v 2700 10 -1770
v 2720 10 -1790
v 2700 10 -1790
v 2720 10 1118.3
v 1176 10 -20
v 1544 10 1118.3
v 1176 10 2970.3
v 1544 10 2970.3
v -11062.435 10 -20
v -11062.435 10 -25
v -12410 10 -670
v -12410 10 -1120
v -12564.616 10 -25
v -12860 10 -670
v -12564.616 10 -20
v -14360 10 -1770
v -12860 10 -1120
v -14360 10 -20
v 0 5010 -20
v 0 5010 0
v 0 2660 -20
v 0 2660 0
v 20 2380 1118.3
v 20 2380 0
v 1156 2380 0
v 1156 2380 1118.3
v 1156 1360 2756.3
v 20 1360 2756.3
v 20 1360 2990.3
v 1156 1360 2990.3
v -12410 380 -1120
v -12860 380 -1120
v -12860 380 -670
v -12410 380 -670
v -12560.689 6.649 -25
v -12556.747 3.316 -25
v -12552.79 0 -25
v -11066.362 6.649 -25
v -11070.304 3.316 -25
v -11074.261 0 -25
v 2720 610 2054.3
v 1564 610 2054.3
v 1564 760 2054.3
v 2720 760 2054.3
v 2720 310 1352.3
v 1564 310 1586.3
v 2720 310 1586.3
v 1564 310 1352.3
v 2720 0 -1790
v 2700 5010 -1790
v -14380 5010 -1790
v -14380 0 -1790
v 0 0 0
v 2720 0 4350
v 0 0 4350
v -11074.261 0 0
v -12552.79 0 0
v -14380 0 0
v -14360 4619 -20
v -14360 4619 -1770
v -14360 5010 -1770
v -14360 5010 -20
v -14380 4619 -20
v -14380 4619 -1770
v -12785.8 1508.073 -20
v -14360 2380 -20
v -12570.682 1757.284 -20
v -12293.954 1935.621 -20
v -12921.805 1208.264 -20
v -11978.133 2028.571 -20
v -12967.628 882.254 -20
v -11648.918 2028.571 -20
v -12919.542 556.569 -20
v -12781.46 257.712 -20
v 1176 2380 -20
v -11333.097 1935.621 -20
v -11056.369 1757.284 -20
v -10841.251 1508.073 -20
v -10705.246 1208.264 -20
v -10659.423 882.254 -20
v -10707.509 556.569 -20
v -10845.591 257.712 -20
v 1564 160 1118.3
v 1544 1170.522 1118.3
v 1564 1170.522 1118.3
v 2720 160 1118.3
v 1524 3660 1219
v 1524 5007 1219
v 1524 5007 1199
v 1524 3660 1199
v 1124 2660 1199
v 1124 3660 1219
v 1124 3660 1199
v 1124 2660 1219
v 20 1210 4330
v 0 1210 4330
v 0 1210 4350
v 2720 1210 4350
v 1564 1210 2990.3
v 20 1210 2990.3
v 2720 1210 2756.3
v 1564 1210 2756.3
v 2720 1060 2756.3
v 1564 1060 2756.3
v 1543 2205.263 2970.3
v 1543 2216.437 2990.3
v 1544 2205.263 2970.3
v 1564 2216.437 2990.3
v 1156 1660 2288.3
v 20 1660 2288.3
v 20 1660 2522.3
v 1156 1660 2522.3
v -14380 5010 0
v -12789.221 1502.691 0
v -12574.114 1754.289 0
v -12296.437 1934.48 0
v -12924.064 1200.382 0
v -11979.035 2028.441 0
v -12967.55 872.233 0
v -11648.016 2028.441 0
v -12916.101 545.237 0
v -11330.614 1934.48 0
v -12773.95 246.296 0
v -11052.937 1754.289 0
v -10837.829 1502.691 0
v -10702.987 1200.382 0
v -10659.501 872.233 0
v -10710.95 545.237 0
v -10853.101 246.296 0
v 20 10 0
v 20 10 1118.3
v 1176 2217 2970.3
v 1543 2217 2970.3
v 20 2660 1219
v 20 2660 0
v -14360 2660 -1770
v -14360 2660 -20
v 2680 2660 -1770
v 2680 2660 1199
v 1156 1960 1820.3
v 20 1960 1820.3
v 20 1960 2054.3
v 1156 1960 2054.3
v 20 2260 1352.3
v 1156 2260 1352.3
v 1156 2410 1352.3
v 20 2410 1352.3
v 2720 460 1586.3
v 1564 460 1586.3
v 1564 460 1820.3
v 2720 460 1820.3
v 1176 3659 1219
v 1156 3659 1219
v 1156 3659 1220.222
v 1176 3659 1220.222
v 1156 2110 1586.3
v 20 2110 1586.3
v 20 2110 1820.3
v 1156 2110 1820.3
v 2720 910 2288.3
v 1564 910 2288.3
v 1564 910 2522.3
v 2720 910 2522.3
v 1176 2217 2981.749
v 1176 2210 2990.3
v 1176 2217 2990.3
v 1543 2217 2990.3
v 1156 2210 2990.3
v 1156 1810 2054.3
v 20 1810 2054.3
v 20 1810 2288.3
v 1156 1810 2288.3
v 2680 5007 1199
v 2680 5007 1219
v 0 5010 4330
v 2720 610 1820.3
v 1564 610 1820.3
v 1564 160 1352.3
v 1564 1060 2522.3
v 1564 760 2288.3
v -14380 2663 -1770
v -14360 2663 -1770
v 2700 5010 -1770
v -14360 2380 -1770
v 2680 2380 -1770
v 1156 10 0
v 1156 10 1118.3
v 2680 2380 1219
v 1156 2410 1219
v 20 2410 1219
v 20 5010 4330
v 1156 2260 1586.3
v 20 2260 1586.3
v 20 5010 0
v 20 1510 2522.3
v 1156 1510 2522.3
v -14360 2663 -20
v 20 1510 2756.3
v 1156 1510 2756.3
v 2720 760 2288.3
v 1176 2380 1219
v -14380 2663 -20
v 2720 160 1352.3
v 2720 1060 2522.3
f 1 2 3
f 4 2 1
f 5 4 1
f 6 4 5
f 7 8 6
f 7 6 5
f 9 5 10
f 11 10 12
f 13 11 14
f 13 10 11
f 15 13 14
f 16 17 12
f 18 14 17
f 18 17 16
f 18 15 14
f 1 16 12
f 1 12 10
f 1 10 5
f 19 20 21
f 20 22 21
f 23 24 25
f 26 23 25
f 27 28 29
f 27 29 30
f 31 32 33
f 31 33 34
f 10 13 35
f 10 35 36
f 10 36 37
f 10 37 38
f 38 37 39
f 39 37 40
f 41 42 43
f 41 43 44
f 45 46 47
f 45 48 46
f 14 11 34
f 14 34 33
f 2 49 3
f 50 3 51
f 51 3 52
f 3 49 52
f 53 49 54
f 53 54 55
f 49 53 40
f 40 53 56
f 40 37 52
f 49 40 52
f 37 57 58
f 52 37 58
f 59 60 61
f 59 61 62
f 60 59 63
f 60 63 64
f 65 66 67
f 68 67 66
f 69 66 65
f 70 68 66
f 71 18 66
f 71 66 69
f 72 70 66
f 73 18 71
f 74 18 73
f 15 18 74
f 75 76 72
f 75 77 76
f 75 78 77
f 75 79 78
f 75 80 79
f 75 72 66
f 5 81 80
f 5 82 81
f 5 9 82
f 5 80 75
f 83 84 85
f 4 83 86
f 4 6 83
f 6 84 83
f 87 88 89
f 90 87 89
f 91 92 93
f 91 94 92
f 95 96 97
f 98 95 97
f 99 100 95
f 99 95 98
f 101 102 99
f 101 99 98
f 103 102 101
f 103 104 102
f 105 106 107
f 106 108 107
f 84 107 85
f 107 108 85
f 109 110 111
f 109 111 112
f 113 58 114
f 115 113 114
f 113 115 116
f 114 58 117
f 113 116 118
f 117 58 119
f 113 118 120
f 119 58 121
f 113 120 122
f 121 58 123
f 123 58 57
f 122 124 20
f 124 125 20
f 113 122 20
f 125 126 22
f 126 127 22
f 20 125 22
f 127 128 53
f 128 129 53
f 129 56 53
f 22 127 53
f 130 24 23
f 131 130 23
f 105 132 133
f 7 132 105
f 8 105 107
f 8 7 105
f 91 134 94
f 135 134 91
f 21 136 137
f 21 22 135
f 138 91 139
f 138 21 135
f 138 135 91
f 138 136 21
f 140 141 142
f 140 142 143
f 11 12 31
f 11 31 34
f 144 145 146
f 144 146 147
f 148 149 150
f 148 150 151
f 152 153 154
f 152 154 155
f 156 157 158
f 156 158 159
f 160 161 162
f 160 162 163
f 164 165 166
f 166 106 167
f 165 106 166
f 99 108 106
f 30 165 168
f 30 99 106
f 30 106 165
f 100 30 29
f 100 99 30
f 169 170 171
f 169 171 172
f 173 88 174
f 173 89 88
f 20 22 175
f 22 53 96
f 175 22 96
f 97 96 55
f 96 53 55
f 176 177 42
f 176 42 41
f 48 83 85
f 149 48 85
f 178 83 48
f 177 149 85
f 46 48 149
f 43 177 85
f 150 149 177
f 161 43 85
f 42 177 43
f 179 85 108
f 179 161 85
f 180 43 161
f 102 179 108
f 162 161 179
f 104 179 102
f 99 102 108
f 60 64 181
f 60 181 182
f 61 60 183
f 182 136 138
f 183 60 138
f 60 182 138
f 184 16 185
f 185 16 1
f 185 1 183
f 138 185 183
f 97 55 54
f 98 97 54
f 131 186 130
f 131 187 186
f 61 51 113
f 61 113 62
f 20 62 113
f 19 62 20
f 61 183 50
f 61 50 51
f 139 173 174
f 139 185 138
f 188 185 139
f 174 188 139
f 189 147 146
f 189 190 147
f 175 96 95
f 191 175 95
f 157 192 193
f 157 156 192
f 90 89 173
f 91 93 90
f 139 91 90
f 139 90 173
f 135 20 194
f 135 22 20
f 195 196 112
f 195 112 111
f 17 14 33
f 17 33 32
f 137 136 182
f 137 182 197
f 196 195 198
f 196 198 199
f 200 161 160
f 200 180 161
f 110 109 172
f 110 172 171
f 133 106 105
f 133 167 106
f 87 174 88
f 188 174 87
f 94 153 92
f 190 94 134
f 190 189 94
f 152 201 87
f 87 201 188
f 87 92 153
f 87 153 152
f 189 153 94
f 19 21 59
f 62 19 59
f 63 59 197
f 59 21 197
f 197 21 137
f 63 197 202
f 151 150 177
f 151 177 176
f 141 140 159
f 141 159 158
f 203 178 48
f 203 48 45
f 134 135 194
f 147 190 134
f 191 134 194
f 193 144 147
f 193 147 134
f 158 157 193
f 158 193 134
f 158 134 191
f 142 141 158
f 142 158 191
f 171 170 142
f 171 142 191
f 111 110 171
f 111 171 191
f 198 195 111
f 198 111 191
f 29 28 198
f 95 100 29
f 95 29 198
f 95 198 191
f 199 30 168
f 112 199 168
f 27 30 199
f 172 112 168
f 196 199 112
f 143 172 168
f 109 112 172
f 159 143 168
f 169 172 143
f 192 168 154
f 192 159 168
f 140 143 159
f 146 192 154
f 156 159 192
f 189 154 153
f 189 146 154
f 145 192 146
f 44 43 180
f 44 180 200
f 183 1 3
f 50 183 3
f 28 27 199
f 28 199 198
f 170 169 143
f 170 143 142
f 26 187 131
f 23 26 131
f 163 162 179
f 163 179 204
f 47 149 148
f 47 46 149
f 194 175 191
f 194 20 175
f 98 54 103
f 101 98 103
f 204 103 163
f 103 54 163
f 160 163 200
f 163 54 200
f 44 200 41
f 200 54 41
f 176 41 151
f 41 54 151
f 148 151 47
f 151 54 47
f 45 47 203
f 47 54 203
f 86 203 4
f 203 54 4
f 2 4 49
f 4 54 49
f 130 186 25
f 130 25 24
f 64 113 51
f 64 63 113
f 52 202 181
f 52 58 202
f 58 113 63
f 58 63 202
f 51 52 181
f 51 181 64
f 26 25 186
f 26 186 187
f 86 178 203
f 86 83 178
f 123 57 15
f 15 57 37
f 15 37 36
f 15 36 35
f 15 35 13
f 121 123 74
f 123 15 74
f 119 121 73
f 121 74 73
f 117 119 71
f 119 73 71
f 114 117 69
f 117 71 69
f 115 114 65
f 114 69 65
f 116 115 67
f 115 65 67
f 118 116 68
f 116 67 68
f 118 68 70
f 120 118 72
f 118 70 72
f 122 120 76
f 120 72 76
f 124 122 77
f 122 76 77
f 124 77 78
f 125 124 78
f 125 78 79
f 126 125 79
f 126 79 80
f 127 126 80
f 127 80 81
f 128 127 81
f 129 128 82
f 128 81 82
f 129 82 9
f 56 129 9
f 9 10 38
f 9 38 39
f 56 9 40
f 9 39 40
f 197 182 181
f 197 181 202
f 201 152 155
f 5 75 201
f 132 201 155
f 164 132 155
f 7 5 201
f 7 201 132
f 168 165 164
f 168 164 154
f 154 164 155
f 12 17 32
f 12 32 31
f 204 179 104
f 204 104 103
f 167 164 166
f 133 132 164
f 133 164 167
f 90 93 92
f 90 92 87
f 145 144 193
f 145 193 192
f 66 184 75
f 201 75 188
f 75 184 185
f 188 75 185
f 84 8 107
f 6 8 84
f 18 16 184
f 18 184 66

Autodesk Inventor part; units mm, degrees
ref_plane "YZ Plane" through (0, 0, 0) normal (1, 0, 0) x (0, 1, 0)
ref_plane "XZ Plane" through (0, 0, 0) normal (0, 1, 0) x (-1, 0, 0)
sketch "Sketch1" plane through (0, 0, 0) normal (0, 1, 0) x (-1, 0, 0)
  line L0 (0, 0) -> (14380, 0)
  line L1 (14380, 0) -> (14380, -1790)
  line L2 (14380, -1790) -> (0, -1790)
  line L3 (0, -1790) -> (0, 0)
  line L4 (0, -1790) -> (-2720, -1790)
  line L5 (-2720, -1790) -> (-2720, 4350)
  line L6 (-2720, 4350) -> (0, 4350)
  line L7 (0, 4350) -> (0, -1790)
  dimension "d0" = 1790
  dimension "d2" = 14380
  dimension "d3" = 2720
  dimension "d4" = 6140
extrude "Extrusion1" add sketch "Sketch1" along normal blind 10
sketch "Sketch2" plane through (0, 10, 0) normal (0, 1, 0) x (1, 0, 0)
  line L0 (2720, -4350) -> (2720, 1790) projected
  line L1 (0, -4350) -> (2720, -4350)
  line L2 (2720, -4350) -> (2720, -4330)
  line L3 (2720, -4330) -> (0, -4330)
  line L4 (0, -4330) -> (0, -4350)
  dimension "d7" = 20
extrude "Extrusion2" [suppressed]
sketch "Sketch3" plane through (0, 10, 0) normal (0, 1, 0) x (1, 0, 0)
  line L0 (2720, 1790) -> (-14380, 1790) projected
  line L1 (2720, -4330) -> (2700, -4330)
  line L2 (2700, -4330) -> (2700, 1790)
  line L3 (2700, 1790) -> (2720, 1790)
  line L4 (2720, 1790) -> (2720, -4330)
  dimension "d11" = 20
sketch "Sketch4" plane through (0, 10, 0) normal (0, 1, 0) x (1, 0, 0)
  line L0 (-14380, 1790) -> (-14380, 0) projected
  line L1 (2700, 1790) -> (-14380, 1790)
  line L2 (-14380, 1790) -> (-14380, 1770)
  line L3 (-14380, 1770) -> (2700, 1770)
  line L4 (2700, 1770) -> (2700, 1790)
  dimension "d15" = 20
extrude "Extrusion4" add sketch "Sketch4" along normal blind 5000
sketch "Sketch5" plane through (0, 10, 0) normal (0, 1, 0) x (1, 0, 0)
  line L0 (-14380, 0) -> (0, 0) projected
  line L1 (-14380, 1770) -> (-14360, 1770)
  line L2 (-14360, 1770) -> (-14360, 0)
  line L3 (-14360, 0) -> (-14380, 0)
  line L4 (-14380, 0) -> (-14380, 1770)
  dimension "d19" = 20
extrude "Extrusion5" add sketch "Sketch5" along normal blind 5000
sketch "Sketch6" plane through (0, 10, 0) normal (0, 1, 0) x (1, 0, 0)
  line L0 (-14360, 0) -> (0, 0)
  line L1 (0, 0) -> (0, 20)
  line L2 (0, 20) -> (-14360, 20)
  line L3 (-14360, 20) -> (-14360, 0)
  dimension "d23" = 20
extrude "Extrusion6" add sketch "Sketch6" along normal blind 5000
sketch "Sketch7" plane through (0, 10, 0) normal (0, 1, 0) x (1, 0, 0)
  line L0 (0, 0) -> (0, -4350) projected
  line L1 (0, -4330) -> (2720, -4330) projected
  line L2 (0, 0) -> (20, 0)
  line L3 (20, 0) -> (20, -4330)
  line L4 (20, -4330) -> (0, -4330)
  line L5 (0, -4330) -> (0, 0)
  point P0 (2700, -4330)
  dimension "d27" = 20
extrude "Extrusion7" add sketch "Sketch7" along normal blind 5000
ref_plane "Work Plane1" through (2690, 10, 4330) normal (-1, 0, 0) x (0, 0, 1)
sketch "Sketch12" plane through (0, 10, 0) normal (0, 1, 0) x (1, 0, 0)
  line L0 (-14360, 1770) -> (-14360, 20) projected
  line L1 (-14360, 20) -> (0, 20) projected
  line L2 (-12860, 1120) -> (-12410, 1120)
  line L3 (-12410, 1120) -> (-12410, 670)
  line L4 (-12410, 670) -> (-12860, 670)
  line L5 (-12860, 670) -> (-12860, 1120)
  dimension "d115" = 1500
  dimension "d116" = 450
  dimension "d117" = 450
  dimension "d118" = 650
extrude "Extrusion12" add sketch "Sketch12" along normal blind 370
sketch "Sketch13" plane through (-14360, 10, -1770) normal (1, 0, 0) x (0, 0, -1)
  line L0 (-1750, 5000) -> (-1750, 0) projected
  line L1 (0, 0) -> (-1750, 0) projected
  line L2 (0, 5000) -> (0, 0) projected
  line L3 (-1750, 5000) -> (0, 5000) projected
  line L4 (-1750, 2650) -> (0, 2650)
  line L5 (0, 2650) -> (0, 2370)
  line L6 (0, 2370) -> (-1750, 2370)
  line L7 (-1750, 2370) -> (-1750, 2650)
  point P0 (-1770, -10)
  dimension "d121" = 2370
  dimension "d122" = 2350
extrude "Extrusion13" add sketch "Sketch13" along normal blind 17040 contours L4 L2 L6 L0
sketch "Sketch14" plane through (0, 2380, -20) normal (0, 0, 1) x (1, 0, 0)
  line L0 (0, 0) -> (0, 280) projected
  line L1 (0, 0) -> (2680, 0) projected
  line L2 (0, 280) -> (2680, 280)
  line L3 (2680, 280) -> (2680, 0)
  line L4 (2680, 0) -> (0, 0)
  line L5 (0, 0) -> (0, 280)
  point P0 (0, -2380)
extrude "Extrusion14" add sketch "Sketch14" along normal blind 1239
sketch "Sketch16" plane through (-14360, 2660, -20) normal (0, 1, 0) x (1, 0, 0)
  line L0 (17040, -1239) -> (15884, -1239)
  line L1 (15884, -1239) -> (15884, -1219)
  line L2 (15884, -1219) -> (17040, -1219)
  line L3 (17040, -1219) -> (17040, -1239)
  line L4 (15884, -1239) -> (15484, -1239)
  line L5 (15484, -1239) -> (15484, -1219)
  line L6 (15484, -1219) -> (15884, -1219)
  line L7 (15884, -1219) -> (15884, -1239)
  dimension "d168" = 20
  dimension "d170" = 1156
  dimension "d258" = 20
  dimension "d259" = 400
extrude "Extrusion17" add sketch "Sketch16" along normal blind 2347 contours L0 L1 L2 L3
sketch "Sketch17" plane through (-14380, 0, -1790) normal (-1, 0, 0) x (0, 0, 1)
  line L0 (0, 5010) -> (1790, 5010) projected
  line L1 (20, 2663) -> (1770, 2663)
  line L2 (1770, 2663) -> (1770, 4619)
  line L3 (1770, 4619) -> (20, 4619)
  line L4 (20, 4619) -> (20, 2663)
  line L5 (0, 0) -> (0, 5010) projected
  dimension "d179" = 20
  dimension "d180" = 1750
  dimension "d181" = 391
  dimension "d182" = 1956
extrude "Extrusion18" cut sketch "Sketch17" along normal mid plane 50
sketch "Sketch18" plane through (-14380, 0, 0) normal (0, 0, 1) x (1, 0, 0)
  line L0 (0, 0) -> (14380, 0) projected
  arc A0 (3305.7392, 0) -> (1827.2099, 0) centre (2566.4746, 886.2602) ccw
extrude "Extrusion19" cut sketch "Sketch18" along normal mid plane 50
sketch "Sketch19" plane through (0, 10, 0) normal (0, 1, 0) x (1, 0, 0)
  line L0 (2720, -4350) -> (2720, 1790) projected
  line L1 (2720, -1118.3) -> (1564, -1118.3)
  line L2 (1564, -1118.3) -> (1564, -1352.3)
  line L3 (1564, -1352.3) -> (2720, -1352.3)
  line L4 (2720, -1352.3) -> (2720, -1118.3)
  line L5 (2700, 1790) -> (-14380, 1790) projected
  line L6 (2720, -1352.3) -> (1564, -1352.3)
  line L7 (1564, -1352.3) -> (1564, -1586.3)
  line L8 (1564, -1586.3) -> (2720, -1586.3)
  line L9 (2720, -1586.3) -> (2720, -1352.3)
  line L10 (2720, -1586.3) -> (1564, -1586.3)
  line L11 (1564, -1586.3) -> (1564, -1820.3)
  line L12 (1564, -1820.3) -> (2720, -1820.3)
  line L13 (2720, -1820.3) -> (2720, -1586.3)
  line L14 (2720, -1820.3) -> (1564, -1820.3)
  line L15 (1564, -1820.3) -> (1564, -2054.3)
  line L16 (1564, -2054.3) -> (2720, -2054.3)
  line L17 (2720, -2054.3) -> (2720, -1820.3)
  line L18 (2720, -2054.3) -> (1564, -2054.3)
  line L19 (1564, -2054.3) -> (1564, -2288.3)
  line L20 (1564, -2288.3) -> (2720, -2288.3)
  line L21 (2720, -2288.3) -> (2720, -2054.3)
  line L22 (2720, -2288.3) -> (1564, -2288.3)
  line L23 (1564, -2288.3) -> (1564, -2522.3)
  line L24 (1564, -2522.3) -> (2720, -2522.3)
  line L25 (2720, -2522.3) -> (2720, -2288.3)
  line L26 (2720, -2522.3) -> (1564, -2522.3)
  line L27 (1564, -2522.3) -> (1564, -2756.3)
  line L28 (1564, -2756.3) -> (2720, -2756.3)
  line L29 (2720, -2756.3) -> (2720, -2522.3)
  line L30 (2720, -2756.3) -> (1564, -2756.3)
  line L31 (1564, -2756.3) -> (1564, -2990.3)
  line L32 (1564, -2990.3) -> (2720, -2990.3)
  line L33 (2720, -2990.3) -> (2720, -2756.3)
  line L34 (0, 0) -> (0, -4350) projected
  line L35 (2720, -2990.3) -> (0, -2990.3)
  line L36 (0, -2990.3) -> (0, -4350)
  line L37 (0, -4350) -> (2720, -4350)
  line L38 (2720, -4350) -> (2720, -2990.3)
  line L39 (0, -2990.3) -> (1156, -2990.3)
  line L40 (1156, -2990.3) -> (1156, -2756.3)
  line L41 (1156, -2756.3) -> (0, -2756.3)
  line L42 (0, -2756.3) -> (0, -2990.3)
  line L43 (0, -2756.3) -> (1156, -2756.3)
  line L44 (1156, -2756.3) -> (1156, -2522.3)
  line L45 (1156, -2522.3) -> (0, -2522.3)
  line L46 (0, -2522.3) -> (0, -2756.3)
  line L47 (0, -2522.3) -> (1156, -2522.3)
  line L48 (1156, -2522.3) -> (1156, -2288.3)
  line L49 (1156, -2288.3) -> (0, -2288.3)
  line L50 (0, -2288.3) -> (0, -2522.3)
  line L51 (0, -2288.3) -> (1156, -2288.3)
  line L52 (1156, -2288.3) -> (1156, -2054.3)
  line L53 (1156, -2054.3) -> (0, -2054.3)
  line L54 (0, -2054.3) -> (0, -2288.3)
  line L55 (0, -2054.3) -> (1156, -2054.3)
  line L56 (1156, -2054.3) -> (1156, -1820.3)
  line L57 (1156, -1820.3) -> (0, -1820.3)
  line L58 (0, -1820.3) -> (0, -2054.3)
  line L59 (0, -1820.3) -> (1156, -1820.3)
  line L60 (1156, -1820.3) -> (1156, -1586.3)
  line L61 (1156, -1586.3) -> (0, -1586.3)
  line L62 (0, -1586.3) -> (0, -1820.3)
  line L63 (0, -1586.3) -> (1156, -1586.3)
  line L64 (1156, -1586.3) -> (1156, -1352.3)
  line L65 (1156, -1352.3) -> (0, -1352.3)
  line L66 (0, -1352.3) -> (0, -1586.3)
  line L67 (0, -1352.3) -> (1156, -1352.3)
  line L68 (1156, -1352.3) -> (1156, -1118.3)
  line L69 (1156, -1118.3) -> (0, -1118.3)
  line L70 (0, -1118.3) -> (0, -1352.3)
  line L71 (-11062.4346, 20) -> (0, 20) projected
  line L72 (0, 20) -> (1156, 20)
  line L73 (1156, 20) -> (1156, 0)
  line L74 (1156, 0) -> (0, 0)
  line L75 (0, 0) -> (0, 20)
  line L76 (0, 20) -> (2680, 20) projected
  line L77 (1156, -2990.3) -> (1176, -2990.3)
  line L78 (1176, -2990.3) -> (1176, 20)
  line L79 (1176, 20) -> (1156, 20)
  line L80 (1156, 20) -> (1156, -2990.3)
  line L81 (1564, -2990.3) -> (1544, -2990.3)
  line L82 (1544, -2990.3) -> (1544, -1118.3)
  line L83 (1544, -1118.3) -> (1564, -1118.3)
  line L84 (1564, -1118.3) -> (1564, -2990.3)
  line L85 (1544, -2990.3) -> (1176, -2990.3)
  line L86 (1176, -2990.3) -> (1176, -2970.3)
  line L87 (1176, -2970.3) -> (1544, -2970.3)
  line L88 (1544, -2970.3) -> (1544, -2990.3)
  point P0 (0, -2756.3)
  point P1 (0, -2522.3)
  point P2 (0, -2288.3)
  point P3 (0, -2054.3)
  point P4 (0, -1820.3)
  point P5 (0, -1586.3)
  point P6 (0, -1352.3)
  point P7 (0, -1118.3)
  dimension "d183" = 2908.3
  dimension "d184" = 234
  dimension "d185" = 1156
  dimension "d186" = 234
  dimension "d187" = 234
  dimension "d188" = 234
  dimension "d189" = 234
  dimension "d190" = 234
  dimension "d191" = 234
  dimension "d192" = 234
  dimension "d193" = 1156
  dimension "d194" = 0
  dimension "d195" = 0
  dimension "d196" = 0
  dimension "d197" = 0
  dimension "d198" = 0
  dimension "d199" = 0
  dimension "d200" = 0
  dimension "d201" = 1156
  dimension "d202" = 1156
  dimension "d203" = 1156
  dimension "d204" = 1156
  dimension "d205" = 1156
  dimension "d206" = 1156
  dimension "d207" = 1156
  dimension "d208" = 234
  dimension "d209" = 1156
  dimension "d210" = 0
  dimension "d211" = 0
  dimension "d212" = 0
  dimension "d213" = 0
  dimension "d214" = 0
  dimension "d215" = 0
  dimension "d216" = 468
  dimension "d251" = 20
  dimension "d252" = 20
  dimension "d253" = 20
  dimension "d268" = 20
extrude "Extrusion20" add sketch "Sketch19" along normal blind 150 contours L1 L0 L3 L2
extrude "Extrusion21" add sketch "Sketch19" along normal blind 300 contours L8 L7 L3 L0
extrude "Extrusion22" add sketch "Sketch19" along normal blind 450 contours L12 L11 L8 L0
extrude "Extrusion23" add sketch "Sketch19" along normal blind 600 contours L16 L15 L12 L0
extrude "Extrusion24" add sketch "Sketch19" along normal blind 750 contours L20 L19 L16 L0
extrude "Extrusion25" add sketch "Sketch19" along normal blind 900 contours L24 L23 L20 L0
extrude "Extrusion26" add sketch "Sketch19" along normal blind 1050 contours L28 L27 L24 L0
extrude "Extrusion27" add sketch "Sketch19" along normal blind 1200 contours L32 L31 L28 L0
extrude "Extrusion28" add sketch "Sketch19" along normal blind 1200 contours L37 L34 L35 L32 L0
extrude "Extrusion29" add sketch "Sketch19" along normal blind 1350 contours L34 L41 L40 L35
extrude "Extrusion30" add sketch "Sketch19" along normal blind 1500 contours L34 L45 L44 L41
extrude "Extrusion31" add sketch "Sketch19" along normal blind 1650 contours L34 L49 L48 L45
extrude "Extrusion32" add sketch "Sketch19" along normal blind 1800 contours L34 L53 L52 L49
extrude "Extrusion33" add sketch "Sketch19" along normal blind 1950 contours L34 L57 L56 L53
extrude "Extrusion34" add sketch "Sketch19" along normal blind 2100 contours L34 L61 L60 L57
extrude "Extrusion35" add sketch "Sketch19" along normal blind 2250 contours L34 L65 L64 L61
extrude "Extrusion36" add sketch "Sketch19" along normal blind 2400 contours L68 L65 L34 L69
extrude "Extrusion37" add sketch "Sketch19" along normal blind 2649 contours L73 L74 L75 L72
extrude "Extrusion38" add sketch "Sketch19" along normal blind 2649 contours L40 L44 L48 L52 L56 L60 L64 L68 L80 L73 L76 L78 L35
extrude "Extrusion39" add sketch "Sketch16" along normal blind 1000 contours L4 L5 L6 L1
sketch "Sketch20" plane through (0, 2659, 0) normal (0, 1, 0) x (1, 0, 0)
  line L0 (1176, -2990.3) -> (1564, -2990.3) projected
  line L1 (1176, -2990.3) -> (1156, -2990.3)
  line L2 (1156, -2990.3) -> (1156, -1199.2515)
  line L3 (1156, -1199.2515) -> (1176, -1199.2515)
  line L4 (1176, -1199.2515) -> (1176, -2990.3)
  point P0 (0, 0)
  dimension "d262" = 20
extrude "Extrusion40" add sketch "Sketch20" along normal blind 1000
sketch "Sketch21" plane through (1176, 10, 2990.3) normal (1, 0, 0) x (0, 0, -1)
  point P0 (2990.3, -10)
sketch "Sketch22" plane through (1176, 10, 2990.3) normal (1, 0, 0) x (0, 0, -1)
  line L0 (0, 1200) -> (0, 3649) projected
  line L1 (1771.3, 2650) -> (1771.3, 3650) projected
  line L2 (0, 2200) -> (1771.3, 3650)
  line L3 (0, 1350) -> (0, 3649) projected
  line L4 (0, 2200) -> (0, 3649)
  line L5 (0, 3649) -> (1771.3, 3649) projected
  line L6 (0, 3649) -> (1771.3, 3649)
  point P0 (2990.3, -10)
  point P1 (1770.0784, 3649)
  dimension "d265" = 1000
extrude "Extrusion41" cut sketch "Sketch22" against normal blind 30 contours L0 L5 L2
extrude "Extrusion42" add sketch "Sketch19" along normal blind 2207 contours L35 L78 L87 L82
extrude "Extrusion43" add sketch "Sketch19" along normal blind 2207 contours L35 L82 L83 L2 L7 L11 L15 L19 L23 L27 L31
sketch "Sketch23" plane through (1564, 160, 1118.3) normal (1, 0, 0) x (0, 0, -1)
  line L0 (-1873.0069, 2057) -> (18.8323, 1000)
  line L1 (0, 0) -> (0, 2057) projected
  line L2 (18.8323, 1000) -> (0, 2057)
  line L3 (0, 2057) -> (-1873.0069, 2057)
  point P0 (1118.3, -160)
  point P1 (0, 1010.5219)
  dimension "d273" = 1000
extrude "Extrusion44" cut sketch "Sketch23" against normal blind 21 contours L3 L1 L0
properties part number "ATF_Corridors_Drawing"
